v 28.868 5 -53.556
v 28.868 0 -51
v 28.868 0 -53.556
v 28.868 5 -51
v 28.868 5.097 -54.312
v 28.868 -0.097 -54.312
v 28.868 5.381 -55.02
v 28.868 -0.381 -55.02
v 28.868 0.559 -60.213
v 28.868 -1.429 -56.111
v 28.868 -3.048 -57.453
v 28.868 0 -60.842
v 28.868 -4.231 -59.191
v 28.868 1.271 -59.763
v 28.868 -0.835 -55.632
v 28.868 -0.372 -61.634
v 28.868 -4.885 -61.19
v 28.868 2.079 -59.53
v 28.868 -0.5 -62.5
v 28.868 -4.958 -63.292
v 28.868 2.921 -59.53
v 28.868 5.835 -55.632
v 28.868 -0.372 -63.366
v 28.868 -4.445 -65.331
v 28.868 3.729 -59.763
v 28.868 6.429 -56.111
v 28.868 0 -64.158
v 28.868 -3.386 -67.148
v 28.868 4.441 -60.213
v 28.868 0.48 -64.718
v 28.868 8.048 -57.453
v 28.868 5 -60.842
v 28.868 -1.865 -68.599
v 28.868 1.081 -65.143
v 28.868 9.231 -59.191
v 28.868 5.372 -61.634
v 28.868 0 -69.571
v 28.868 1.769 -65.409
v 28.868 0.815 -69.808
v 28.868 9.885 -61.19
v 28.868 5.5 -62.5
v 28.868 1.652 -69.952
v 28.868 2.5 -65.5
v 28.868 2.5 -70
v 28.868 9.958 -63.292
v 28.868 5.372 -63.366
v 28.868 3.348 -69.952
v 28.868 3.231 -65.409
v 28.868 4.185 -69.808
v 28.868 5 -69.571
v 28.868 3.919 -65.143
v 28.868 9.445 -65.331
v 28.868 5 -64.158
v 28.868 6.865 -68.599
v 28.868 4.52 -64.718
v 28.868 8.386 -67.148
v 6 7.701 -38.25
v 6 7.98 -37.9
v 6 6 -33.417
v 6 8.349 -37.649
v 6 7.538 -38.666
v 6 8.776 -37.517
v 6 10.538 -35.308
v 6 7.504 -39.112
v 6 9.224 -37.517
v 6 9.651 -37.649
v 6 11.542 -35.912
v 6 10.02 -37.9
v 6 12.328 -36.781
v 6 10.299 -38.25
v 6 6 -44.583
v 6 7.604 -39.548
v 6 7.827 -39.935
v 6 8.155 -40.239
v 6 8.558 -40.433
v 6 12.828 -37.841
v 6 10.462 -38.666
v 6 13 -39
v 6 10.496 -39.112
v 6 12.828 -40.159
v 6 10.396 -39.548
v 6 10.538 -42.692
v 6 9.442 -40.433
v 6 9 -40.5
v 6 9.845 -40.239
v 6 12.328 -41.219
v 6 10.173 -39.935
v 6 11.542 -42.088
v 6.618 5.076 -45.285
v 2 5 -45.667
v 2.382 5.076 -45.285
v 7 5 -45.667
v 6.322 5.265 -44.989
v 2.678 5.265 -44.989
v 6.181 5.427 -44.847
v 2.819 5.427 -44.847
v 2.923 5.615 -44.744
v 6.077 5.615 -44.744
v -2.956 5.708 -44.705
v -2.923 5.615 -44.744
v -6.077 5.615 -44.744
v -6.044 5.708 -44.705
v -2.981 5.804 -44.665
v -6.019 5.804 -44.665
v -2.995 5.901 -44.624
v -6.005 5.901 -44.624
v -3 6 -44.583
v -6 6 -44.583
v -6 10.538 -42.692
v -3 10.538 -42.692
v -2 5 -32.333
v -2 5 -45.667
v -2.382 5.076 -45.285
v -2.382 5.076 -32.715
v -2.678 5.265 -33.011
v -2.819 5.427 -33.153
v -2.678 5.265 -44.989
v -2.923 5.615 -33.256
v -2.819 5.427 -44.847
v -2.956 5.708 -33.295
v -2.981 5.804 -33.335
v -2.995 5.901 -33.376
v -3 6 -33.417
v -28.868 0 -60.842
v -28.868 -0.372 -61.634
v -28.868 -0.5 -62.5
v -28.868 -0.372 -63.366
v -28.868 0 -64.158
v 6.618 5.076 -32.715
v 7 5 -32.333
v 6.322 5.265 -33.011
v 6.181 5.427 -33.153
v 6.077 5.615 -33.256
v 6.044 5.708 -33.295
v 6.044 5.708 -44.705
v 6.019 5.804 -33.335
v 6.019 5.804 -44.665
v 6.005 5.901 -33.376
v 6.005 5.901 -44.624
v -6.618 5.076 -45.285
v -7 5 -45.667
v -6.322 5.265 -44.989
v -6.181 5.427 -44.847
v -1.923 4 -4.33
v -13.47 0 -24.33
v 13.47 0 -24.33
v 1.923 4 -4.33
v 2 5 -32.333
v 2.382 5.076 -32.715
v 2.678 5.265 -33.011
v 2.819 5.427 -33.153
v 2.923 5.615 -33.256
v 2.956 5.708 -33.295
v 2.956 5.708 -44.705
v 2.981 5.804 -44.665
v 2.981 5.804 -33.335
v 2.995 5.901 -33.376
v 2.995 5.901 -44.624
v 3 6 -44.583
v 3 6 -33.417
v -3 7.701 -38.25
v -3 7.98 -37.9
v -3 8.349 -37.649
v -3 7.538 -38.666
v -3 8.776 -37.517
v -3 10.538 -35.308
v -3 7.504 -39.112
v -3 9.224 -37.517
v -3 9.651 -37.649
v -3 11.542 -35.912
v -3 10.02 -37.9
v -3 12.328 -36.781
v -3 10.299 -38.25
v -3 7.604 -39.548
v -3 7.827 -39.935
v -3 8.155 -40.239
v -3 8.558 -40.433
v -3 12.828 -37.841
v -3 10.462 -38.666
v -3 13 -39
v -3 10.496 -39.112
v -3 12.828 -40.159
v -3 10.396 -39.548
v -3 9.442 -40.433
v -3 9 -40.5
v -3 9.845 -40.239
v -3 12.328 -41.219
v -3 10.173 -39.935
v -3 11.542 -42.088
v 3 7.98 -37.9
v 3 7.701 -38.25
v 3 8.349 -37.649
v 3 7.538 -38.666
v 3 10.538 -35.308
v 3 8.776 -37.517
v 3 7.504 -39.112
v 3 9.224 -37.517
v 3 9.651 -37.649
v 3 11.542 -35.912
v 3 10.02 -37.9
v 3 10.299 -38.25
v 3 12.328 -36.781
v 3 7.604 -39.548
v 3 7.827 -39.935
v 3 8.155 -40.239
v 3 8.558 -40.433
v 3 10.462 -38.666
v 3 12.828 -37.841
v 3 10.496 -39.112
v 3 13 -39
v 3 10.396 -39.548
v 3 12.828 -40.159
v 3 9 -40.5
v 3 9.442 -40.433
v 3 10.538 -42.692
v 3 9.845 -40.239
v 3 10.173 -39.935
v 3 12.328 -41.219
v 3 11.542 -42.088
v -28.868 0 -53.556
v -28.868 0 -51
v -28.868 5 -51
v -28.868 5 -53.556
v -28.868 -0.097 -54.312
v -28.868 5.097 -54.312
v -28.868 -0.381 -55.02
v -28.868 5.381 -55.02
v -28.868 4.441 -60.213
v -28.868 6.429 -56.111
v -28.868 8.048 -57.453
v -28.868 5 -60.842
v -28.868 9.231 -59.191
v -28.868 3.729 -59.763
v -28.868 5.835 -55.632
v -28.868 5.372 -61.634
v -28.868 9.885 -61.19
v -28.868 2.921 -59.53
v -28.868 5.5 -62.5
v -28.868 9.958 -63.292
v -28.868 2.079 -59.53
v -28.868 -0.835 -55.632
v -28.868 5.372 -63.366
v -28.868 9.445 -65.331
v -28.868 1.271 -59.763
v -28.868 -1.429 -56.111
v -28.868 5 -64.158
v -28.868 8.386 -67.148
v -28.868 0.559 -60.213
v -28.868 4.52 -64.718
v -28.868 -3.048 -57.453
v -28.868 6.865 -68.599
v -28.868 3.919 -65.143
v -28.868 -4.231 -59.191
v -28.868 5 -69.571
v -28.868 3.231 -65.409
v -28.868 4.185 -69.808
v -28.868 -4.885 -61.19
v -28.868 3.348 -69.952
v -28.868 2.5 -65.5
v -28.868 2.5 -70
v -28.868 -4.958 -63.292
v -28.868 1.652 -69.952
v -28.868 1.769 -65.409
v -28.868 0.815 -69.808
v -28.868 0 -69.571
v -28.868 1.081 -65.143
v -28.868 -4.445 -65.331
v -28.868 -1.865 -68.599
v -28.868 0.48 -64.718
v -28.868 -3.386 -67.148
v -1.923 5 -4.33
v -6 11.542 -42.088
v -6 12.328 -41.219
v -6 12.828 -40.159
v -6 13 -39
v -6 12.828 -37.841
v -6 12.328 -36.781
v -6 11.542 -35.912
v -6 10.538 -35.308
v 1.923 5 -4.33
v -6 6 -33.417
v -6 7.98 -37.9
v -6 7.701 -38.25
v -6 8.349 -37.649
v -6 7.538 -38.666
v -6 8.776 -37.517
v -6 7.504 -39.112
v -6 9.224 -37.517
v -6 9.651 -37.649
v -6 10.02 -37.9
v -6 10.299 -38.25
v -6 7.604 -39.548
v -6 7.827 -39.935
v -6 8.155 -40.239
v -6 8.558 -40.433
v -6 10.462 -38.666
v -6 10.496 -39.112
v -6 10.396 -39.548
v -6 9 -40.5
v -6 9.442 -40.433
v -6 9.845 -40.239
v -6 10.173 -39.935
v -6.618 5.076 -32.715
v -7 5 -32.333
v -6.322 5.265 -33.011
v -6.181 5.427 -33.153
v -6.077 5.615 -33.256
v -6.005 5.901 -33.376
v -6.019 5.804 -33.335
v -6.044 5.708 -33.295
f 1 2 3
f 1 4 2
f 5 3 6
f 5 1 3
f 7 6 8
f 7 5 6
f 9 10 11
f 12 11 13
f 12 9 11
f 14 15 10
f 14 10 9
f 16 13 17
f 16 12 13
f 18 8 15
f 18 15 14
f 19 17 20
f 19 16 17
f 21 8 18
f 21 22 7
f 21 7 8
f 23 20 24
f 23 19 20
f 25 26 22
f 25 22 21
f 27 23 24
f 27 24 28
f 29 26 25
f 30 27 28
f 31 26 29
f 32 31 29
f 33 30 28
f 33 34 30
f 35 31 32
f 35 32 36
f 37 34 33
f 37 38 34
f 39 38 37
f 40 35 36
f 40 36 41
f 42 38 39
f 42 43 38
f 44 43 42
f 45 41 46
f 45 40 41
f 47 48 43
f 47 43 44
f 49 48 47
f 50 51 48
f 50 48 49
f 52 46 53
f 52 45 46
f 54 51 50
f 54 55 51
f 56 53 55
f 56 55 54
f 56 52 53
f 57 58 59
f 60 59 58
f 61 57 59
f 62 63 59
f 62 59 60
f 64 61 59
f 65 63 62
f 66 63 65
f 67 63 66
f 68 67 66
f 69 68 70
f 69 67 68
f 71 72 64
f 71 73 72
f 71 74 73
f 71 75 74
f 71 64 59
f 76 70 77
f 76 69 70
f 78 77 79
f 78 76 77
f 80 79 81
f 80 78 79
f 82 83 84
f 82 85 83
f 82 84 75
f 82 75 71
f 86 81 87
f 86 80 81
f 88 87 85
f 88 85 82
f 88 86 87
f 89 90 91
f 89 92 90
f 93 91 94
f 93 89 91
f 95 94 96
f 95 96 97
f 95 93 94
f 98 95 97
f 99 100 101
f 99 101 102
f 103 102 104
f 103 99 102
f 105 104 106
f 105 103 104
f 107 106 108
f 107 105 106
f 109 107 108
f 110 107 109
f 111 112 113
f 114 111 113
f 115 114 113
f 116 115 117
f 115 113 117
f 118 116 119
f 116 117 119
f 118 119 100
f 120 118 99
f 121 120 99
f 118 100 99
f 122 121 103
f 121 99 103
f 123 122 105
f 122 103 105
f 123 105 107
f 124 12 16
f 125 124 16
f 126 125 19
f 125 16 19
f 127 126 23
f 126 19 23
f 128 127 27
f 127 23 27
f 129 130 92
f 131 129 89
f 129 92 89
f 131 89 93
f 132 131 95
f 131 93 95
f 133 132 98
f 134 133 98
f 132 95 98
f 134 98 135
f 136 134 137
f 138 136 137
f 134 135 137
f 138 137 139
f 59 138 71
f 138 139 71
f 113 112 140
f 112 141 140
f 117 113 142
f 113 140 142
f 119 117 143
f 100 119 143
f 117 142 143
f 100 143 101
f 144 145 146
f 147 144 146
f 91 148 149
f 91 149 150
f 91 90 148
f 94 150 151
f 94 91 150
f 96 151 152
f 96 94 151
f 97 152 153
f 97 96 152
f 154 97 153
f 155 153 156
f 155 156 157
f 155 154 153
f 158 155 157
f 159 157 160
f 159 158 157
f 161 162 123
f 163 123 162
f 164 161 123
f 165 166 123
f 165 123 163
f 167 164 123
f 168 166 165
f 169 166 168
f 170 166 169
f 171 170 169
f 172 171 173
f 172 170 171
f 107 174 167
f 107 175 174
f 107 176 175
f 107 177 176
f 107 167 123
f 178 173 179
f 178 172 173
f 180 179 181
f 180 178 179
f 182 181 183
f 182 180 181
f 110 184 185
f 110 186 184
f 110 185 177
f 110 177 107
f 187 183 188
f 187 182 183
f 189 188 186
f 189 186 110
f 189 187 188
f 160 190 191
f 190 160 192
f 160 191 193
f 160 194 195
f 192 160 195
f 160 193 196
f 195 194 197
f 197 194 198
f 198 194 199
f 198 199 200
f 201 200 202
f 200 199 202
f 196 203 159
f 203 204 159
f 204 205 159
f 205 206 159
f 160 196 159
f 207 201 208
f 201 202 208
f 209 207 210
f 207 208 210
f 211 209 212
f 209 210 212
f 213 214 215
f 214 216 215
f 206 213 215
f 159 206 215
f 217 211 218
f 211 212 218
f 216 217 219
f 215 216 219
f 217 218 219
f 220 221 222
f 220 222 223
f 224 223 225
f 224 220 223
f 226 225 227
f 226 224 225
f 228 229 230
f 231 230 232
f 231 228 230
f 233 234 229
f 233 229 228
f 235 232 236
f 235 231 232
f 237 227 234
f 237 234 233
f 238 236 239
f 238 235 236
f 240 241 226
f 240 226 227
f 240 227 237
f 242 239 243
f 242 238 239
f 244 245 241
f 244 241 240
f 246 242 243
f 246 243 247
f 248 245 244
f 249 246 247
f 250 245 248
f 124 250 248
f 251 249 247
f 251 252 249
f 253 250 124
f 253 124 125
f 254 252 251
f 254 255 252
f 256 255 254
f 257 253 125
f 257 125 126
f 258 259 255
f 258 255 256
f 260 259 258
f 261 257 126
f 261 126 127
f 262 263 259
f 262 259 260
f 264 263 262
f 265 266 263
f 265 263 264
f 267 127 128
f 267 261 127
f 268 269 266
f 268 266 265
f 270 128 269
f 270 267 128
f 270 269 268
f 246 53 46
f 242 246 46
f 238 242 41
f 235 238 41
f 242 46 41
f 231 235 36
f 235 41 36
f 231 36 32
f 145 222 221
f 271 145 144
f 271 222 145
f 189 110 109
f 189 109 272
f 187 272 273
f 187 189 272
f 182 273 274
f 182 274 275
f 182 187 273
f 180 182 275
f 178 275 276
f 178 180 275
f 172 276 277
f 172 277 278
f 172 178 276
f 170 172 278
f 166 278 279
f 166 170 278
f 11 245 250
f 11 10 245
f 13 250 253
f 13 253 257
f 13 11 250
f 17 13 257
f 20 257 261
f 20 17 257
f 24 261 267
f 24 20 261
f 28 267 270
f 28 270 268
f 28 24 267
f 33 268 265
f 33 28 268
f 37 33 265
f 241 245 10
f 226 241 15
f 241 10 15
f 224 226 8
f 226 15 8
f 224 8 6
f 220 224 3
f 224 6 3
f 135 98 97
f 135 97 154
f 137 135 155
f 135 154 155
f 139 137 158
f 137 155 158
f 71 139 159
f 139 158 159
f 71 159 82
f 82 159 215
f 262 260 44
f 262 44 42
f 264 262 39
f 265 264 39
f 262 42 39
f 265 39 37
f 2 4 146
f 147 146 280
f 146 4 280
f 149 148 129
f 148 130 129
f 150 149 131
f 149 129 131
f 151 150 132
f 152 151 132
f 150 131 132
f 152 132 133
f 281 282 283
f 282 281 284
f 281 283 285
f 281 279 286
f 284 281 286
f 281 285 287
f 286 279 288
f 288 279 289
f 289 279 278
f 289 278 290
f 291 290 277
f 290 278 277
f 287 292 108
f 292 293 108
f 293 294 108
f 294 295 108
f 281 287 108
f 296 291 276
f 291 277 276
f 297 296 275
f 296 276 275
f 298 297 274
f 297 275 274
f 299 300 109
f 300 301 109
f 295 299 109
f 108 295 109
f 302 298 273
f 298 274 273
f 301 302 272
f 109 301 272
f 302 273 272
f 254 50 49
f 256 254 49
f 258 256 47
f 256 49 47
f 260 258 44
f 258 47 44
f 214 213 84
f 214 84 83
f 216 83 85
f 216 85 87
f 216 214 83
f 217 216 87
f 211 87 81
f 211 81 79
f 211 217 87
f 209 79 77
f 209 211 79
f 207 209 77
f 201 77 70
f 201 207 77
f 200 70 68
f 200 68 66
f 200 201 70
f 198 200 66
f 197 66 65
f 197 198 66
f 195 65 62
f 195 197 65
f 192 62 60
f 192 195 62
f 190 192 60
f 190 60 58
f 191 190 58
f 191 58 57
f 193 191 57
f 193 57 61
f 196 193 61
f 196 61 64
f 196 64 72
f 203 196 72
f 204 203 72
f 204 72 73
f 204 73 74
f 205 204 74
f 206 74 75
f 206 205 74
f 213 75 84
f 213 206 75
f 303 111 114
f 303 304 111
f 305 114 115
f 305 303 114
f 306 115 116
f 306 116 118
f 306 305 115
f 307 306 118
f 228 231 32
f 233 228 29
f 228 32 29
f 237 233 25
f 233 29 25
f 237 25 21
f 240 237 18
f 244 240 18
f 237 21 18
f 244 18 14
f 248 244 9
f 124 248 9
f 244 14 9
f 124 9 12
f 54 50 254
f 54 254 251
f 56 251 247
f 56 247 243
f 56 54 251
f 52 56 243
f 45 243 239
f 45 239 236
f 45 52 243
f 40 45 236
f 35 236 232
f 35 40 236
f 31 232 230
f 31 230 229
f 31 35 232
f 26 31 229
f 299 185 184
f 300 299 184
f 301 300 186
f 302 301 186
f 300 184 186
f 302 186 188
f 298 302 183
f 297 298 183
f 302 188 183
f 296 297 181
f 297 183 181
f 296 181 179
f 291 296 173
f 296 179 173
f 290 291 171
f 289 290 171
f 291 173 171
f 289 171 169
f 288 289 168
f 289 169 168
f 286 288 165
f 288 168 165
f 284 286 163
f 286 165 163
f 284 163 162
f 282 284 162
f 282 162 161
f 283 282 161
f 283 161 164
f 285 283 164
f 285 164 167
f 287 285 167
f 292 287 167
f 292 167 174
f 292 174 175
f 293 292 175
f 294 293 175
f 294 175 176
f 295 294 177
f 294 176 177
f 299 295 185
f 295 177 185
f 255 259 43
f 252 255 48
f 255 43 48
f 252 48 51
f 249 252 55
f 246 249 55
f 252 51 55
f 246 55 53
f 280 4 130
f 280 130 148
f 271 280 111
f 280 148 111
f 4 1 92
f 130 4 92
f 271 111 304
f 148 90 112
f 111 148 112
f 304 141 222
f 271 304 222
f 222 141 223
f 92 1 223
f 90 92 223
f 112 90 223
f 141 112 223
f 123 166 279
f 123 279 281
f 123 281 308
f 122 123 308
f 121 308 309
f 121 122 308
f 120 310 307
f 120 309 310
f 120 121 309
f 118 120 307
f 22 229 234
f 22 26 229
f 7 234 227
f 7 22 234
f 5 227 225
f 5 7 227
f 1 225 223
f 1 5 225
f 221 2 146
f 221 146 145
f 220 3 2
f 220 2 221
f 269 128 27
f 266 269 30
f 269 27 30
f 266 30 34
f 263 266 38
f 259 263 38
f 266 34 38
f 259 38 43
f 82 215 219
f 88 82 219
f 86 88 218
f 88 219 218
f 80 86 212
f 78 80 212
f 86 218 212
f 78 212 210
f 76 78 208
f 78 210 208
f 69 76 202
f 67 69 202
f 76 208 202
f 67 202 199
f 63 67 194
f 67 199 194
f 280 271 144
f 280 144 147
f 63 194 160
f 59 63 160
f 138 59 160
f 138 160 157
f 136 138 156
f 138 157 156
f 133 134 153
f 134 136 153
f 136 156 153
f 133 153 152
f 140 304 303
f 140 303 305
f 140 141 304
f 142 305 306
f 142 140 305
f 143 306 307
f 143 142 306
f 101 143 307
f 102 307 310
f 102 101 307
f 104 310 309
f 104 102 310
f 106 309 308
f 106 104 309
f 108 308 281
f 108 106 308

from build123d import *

# Parameters (mm, degrees)
BOSS_EXTRUDE1_DEPTH = 5
SKETCH2_R           = 7.5
SKETCH2_R_2         = 3
BOSS_EXTRUDE2_DEPTH = 57.735026919
CUT_EXTRUDE1_DEPTH  = 57.735026919
CUT_EXTRUDE2_DEPTH  = 5
FILLET1_R           = 3
CUT_EXTRUDE3_DEPTH  = 0.5
CHAMFER1_SIZE       = 4
CHAMFER1_SIZE2      = 20
BOSS_EXTRUDE3_START = 3
SKETCH5_R           = 1.5
BOSS_EXTRUDE3_DEPTH = 3
FILLET2_R           = 1


with BuildPart() as part:
    # Sketch1 → Boss-Extrude1 (new body)
    with BuildSketch(Plane(origin=(0, 0, 0), x_dir=(1, 0, 0), z_dir=(0, 1, 0))):
        Polygon((-28.867513459, 50), (-28.867513459, 70), (28.867513459, 70), (28.867513459, 50), (0, 0), align=None)
    extrude(amount=BOSS_EXTRUDE1_DEPTH)

    # Sketch2 → Boss-Extrude2 (add)
    with BuildSketch(Plane(origin=(28.867513459, 0, 0), x_dir=(0, 0, -1), z_dir=(1, 0, 0))):
        with Locations((62.5, 2.5)):
            Circle(SKETCH2_R)
        with Locations((62.5, 2.5)):
            Circle(SKETCH2_R_2, mode=Mode.SUBTRACT)
    extrude(amount=-BOSS_EXTRUDE2_DEPTH)

    # Sketch2<2> → Cut-Extrude1 (cut)
    with BuildSketch(Plane(origin=(28.867513459, 0, 0), x_dir=(0, 0, -1), z_dir=(1, 0, 0))):
        with BuildLine():
            ThreePointArc((65.5, 2.5), (65.143382037, 3.918637165), (64.158312395, 5))
            Line((64.158312395, 5), (60.841687605, 5))
            ThreePointArc((60.841687605, 5), (59.5, 2.5), (60.841687605, 0))
            Line((60.841687605, 0), (64.158312395, 0))
            ThreePointArc((64.158312395, 0), (65.143382037, 1.081362835), (65.5, 2.5))
        make_face()
        with BuildLine():
            Line((60.841687605, 5), (64.158312395, 5))
            ThreePointArc((64.158312395, 5), (62.5, 5.5), (60.841687605, 5))
        make_face()
        with BuildLine():
            ThreePointArc((60.841687605, 0), (62.5, -0.5), (64.158312395, 0))
            Line((64.158312395, 0), (60.841687605, 0))
        make_face()
        with BuildLine():
            ThreePointArc((69.571067812, 5), (69.891989197, 3.76826484), (70, 2.5))
            Line((70, 2.5), (70, 5))
            Line((70, 5), (69.571067812, 5))
        make_face()
        with BuildLine():
            Line((70, 0), (70, 2.5))
            ThreePointArc((70, 2.5), (69.891989197, 1.23173516), (69.571067812, 0))
            Line((69.571067812, 0), (70, 0))
        make_face()
    extrude(amount=-CUT_EXTRUDE1_DEPTH, mode=Mode.SUBTRACT)

    # Sketch3 → Cut-Extrude2 (cut)
    with BuildSketch(Plane(origin=(0, 5, 0), x_dir=(1, 0, 0), z_dir=(0, 1, 0))):
        Polygon((-2.5, 4.330127019), (2.5, 4.330127019), (0, 0), align=None)
    extrude(amount=-CUT_EXTRUDE2_DEPTH, mode=Mode.SUBTRACT)

    # Fillet1
    fillet1_edges = [part.edges().sort_by_distance(p)[0] for p in [
        (0, 0, -55.428932188),
        (0, 5, -55.428932188),
    ]]
    fillet(fillet1_edges, radius=FILLET1_R)

    # Sketch4 → Cut-Extrude3 (cut)
    with BuildSketch(Plane(origin=(0, 0, 0), x_dir=(0.5000000000000001, 0, -0.8660254037844386), z_dir=(0.8660254037844386, 0, 0.5000000000000001))):
        with BuildLine():
            Line((57.735026919, 0), (60.814377774, 0))
            add(Edge.make_bspline(
                [(63.027511115, -1.428571429), (62.266746529, 0), (60.814377774, 0)],
                knots=[2.122113296, 2.122113296, 2.122113296, 3.141592654, 3.141592654, 3.141592654], degree=2, weights=[1, 0.872871561, 1]))
            add(Edge.make_bspline(
                [(63.027511115, -1.428571429), (75.055534995, -24.014916241), (75.055534995, 2.5), (75.055534995, 29.014916241), (63.027511115, 6.428571429)],
                knots=[5.26370595, 5.26370595, 5.26370595, 7.853981634, 7.853981634, 10.444257318, 10.444257318, 10.444257318], degree=2, weights=[1, 0.27218062, 1, 0.27218062, 1]))
            add(Edge.make_bspline(
                [(60.814377774, 5), (62.266746529, 5), (63.027511115, 6.428571429)],
                knots=[3.141592654, 3.141592654, 3.141592654, 4.161072011, 4.161072011, 4.161072011], degree=2, weights=[1, 0.872871561, 1]))
            Line((60.814377774, 5), (57.735026919, 5))
            Line((57.735026919, 5), (5, 5))
            Line((5, 5), (2.5, 5))
            Line((2.5, 5), (2.5, 0))
            Line((2.5, 0), (5, 0))
            Line((5, 0), (57.735026919, 0))
        make_face()
    cut_extrude3 = extrude(amount=-CUT_EXTRUDE3_DEPTH, mode=Mode.SUBTRACT)

    # Mirror1: Cut-Extrude3 across plane
    add(cut_extrude3.mirror(Plane(origin=(0, 0, 0), x_dir=(0, 0, 1), z_dir=(1, 0, 0))), mode=Mode.SUBTRACT)

    # Chamfer1
    chamfer1_edges = [part.edges().sort_by_distance(p)[0] for p in [
        (0, 0, -4.330127019),
    ]]
    chamfer1_side = [part.faces().sort_by_distance(p)[0] for p in [
        (0, 2.5, -4.330127019),
    ]]
    chamfer(chamfer1_edges, length=CHAMFER1_SIZE, length2=CHAMFER1_SIZE2, reference=chamfer1_side[0])

    # Sketch5 → Boss-Extrude3 (add)
    with BuildSketch(Plane(origin=(0, 0, 0), x_dir=(0, 0, -1), z_dir=(1, 0, 0)).offset(BOSS_EXTRUDE3_START)):
        with BuildLine():
            Line((35.307692308, 10.538461538), (33, 5))
            Line((33, 5), (45, 5))
            Line((45, 5), (42.692307692, 10.538461538))
            ThreePointArc((42.692307692, 10.538461538), (39, 13), (35.307692308, 10.538461538))
        make_face()
        with Locations((39, 9)):
            Circle(SKETCH5_R, mode=Mode.SUBTRACT)
    boss_extrude3 = extrude(amount=BOSS_EXTRUDE3_DEPTH)

    # Mirror2: Boss-Extrude3 across plane
    add(boss_extrude3.mirror(Plane(origin=(0, 0, 0), x_dir=(0, 0, 1), z_dir=(1, 0, 0))))

    # Fillet2
    fillet2_edges = [part.edges().sort_by_distance(p)[0] for p in [
        (6, 5, -39),
        (3, 5, -39),
        (4.5, 5, -33),
        (4.5, 5, -45),
        (-6, 5, -39),
        (-4.5, 5, -45),
        (-4.5, 5, -33),
        (-3, 5, -39),
    ]]
    fillet(fillet2_edges, radius=FILLET2_R)


solid = part.part
